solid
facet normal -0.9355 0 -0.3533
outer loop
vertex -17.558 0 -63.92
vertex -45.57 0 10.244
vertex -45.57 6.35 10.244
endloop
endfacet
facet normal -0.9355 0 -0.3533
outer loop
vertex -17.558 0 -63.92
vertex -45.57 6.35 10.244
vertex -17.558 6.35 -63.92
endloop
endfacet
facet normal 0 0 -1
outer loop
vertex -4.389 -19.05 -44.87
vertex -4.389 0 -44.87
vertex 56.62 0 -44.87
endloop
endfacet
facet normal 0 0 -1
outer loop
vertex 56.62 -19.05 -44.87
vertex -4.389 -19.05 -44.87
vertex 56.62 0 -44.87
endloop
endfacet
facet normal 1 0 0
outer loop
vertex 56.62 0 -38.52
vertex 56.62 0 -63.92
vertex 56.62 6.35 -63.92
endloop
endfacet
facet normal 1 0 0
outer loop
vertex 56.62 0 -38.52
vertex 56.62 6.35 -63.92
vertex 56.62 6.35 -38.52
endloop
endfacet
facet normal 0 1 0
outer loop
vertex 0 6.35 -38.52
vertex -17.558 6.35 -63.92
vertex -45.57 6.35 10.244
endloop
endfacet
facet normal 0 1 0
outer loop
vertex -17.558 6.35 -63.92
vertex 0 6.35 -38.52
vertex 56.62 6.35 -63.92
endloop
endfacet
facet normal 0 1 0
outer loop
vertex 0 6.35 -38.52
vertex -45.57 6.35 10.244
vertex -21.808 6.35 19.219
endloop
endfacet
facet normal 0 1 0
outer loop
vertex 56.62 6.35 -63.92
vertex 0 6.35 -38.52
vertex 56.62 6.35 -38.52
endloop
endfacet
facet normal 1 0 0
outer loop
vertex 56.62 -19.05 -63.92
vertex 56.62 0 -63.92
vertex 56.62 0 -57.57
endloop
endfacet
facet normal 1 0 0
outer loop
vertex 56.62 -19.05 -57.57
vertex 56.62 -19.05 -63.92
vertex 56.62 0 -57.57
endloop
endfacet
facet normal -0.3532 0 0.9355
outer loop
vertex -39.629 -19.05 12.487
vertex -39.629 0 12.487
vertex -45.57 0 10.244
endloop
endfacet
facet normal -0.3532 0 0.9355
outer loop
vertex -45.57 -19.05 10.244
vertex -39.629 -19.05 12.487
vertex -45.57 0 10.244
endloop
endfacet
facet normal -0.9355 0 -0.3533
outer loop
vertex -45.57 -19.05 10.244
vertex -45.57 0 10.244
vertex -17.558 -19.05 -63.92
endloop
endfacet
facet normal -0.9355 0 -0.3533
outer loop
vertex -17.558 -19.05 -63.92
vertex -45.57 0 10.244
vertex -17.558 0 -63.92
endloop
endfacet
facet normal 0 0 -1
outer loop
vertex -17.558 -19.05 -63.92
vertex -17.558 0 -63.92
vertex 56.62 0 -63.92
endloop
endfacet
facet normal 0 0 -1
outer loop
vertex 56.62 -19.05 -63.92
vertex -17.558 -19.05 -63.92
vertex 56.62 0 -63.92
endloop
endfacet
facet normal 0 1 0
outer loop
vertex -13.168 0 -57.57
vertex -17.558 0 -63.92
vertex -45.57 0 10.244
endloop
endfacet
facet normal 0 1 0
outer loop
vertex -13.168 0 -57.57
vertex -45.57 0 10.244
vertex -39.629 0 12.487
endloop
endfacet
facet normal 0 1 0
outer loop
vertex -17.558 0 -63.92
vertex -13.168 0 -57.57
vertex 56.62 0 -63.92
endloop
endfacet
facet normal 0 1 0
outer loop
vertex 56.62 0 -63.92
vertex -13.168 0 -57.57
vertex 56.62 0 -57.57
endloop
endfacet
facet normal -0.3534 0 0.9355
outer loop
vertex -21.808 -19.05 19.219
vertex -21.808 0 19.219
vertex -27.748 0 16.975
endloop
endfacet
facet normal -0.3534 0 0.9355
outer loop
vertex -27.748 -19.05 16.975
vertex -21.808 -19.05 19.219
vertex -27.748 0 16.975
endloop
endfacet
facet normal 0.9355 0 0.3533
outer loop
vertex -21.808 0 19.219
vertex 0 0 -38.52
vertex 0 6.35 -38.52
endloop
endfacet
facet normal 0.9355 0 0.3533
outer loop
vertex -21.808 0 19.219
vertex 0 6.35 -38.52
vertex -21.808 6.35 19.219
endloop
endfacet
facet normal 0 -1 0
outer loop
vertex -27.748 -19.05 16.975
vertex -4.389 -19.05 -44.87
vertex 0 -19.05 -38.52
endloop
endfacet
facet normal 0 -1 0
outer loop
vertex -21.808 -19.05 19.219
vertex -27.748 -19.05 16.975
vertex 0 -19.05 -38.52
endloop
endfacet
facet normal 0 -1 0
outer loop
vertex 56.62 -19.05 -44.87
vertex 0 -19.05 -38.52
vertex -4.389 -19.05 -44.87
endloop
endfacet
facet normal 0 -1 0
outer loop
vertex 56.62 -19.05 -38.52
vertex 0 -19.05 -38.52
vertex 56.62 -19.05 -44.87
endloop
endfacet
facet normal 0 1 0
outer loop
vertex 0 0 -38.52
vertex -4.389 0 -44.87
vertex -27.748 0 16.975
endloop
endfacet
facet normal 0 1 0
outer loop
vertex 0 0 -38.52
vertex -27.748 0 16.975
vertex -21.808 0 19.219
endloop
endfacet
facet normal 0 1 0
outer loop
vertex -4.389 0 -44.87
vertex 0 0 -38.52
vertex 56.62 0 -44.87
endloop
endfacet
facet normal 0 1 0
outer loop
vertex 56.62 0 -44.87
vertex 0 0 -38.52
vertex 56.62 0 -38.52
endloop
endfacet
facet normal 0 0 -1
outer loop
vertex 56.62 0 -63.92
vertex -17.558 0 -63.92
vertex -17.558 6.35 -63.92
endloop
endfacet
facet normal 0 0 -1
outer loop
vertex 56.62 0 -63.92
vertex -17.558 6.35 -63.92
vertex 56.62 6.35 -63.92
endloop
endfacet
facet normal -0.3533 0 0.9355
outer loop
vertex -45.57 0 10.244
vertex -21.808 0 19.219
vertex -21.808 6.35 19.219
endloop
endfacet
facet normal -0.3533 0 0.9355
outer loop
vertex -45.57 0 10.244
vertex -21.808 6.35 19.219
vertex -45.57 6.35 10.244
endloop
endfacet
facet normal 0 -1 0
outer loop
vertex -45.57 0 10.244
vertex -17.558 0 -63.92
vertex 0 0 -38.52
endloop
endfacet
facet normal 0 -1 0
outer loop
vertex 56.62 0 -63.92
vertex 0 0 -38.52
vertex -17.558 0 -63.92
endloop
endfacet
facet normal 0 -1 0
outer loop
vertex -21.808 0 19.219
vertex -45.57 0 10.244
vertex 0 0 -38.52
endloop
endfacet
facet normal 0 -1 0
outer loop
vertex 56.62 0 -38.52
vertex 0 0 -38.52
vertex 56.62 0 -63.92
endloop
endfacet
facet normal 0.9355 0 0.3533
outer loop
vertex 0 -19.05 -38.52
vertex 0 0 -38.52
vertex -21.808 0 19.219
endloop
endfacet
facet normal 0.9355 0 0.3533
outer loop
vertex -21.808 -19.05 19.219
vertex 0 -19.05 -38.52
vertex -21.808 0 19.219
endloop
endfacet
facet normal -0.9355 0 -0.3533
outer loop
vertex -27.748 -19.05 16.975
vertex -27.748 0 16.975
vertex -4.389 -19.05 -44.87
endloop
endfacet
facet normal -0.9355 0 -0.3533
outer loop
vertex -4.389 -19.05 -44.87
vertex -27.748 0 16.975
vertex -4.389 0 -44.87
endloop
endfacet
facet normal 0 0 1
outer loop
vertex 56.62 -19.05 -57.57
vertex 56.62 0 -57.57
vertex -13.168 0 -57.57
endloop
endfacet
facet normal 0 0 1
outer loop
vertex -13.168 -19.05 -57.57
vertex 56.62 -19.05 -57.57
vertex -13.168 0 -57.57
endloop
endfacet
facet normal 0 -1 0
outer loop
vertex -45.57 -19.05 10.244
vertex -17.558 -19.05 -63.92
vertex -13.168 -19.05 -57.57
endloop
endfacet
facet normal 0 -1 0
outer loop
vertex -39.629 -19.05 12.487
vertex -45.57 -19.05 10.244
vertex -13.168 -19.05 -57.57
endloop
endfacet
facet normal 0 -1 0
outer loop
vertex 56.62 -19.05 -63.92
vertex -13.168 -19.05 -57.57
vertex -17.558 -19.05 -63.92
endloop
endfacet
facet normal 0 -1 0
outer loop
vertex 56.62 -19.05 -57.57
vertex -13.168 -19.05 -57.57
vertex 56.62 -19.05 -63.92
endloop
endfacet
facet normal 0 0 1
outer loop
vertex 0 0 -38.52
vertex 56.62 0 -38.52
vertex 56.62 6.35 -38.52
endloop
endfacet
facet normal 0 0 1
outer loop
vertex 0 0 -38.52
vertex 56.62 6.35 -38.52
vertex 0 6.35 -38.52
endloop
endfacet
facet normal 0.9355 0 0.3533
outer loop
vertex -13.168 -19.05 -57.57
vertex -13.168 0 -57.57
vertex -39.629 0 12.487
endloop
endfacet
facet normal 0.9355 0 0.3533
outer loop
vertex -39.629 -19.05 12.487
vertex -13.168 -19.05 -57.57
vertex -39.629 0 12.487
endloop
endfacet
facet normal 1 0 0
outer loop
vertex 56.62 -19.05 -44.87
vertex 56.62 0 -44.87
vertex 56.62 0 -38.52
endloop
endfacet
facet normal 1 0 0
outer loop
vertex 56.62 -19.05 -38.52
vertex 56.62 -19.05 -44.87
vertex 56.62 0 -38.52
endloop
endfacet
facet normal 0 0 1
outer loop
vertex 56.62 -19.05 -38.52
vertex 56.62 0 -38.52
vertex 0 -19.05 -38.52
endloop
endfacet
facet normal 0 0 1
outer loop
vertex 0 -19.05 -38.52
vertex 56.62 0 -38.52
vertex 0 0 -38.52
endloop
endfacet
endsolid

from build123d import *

# Parameters (mm, degrees)
F2_DEPTH = 19.05
F4_DEPTH = 19.05
F5_DEPTH = 6.35


with BuildPart() as f2:
    # F1 (on Front) → F2 (new body)
    with BuildSketch(Plane.XZ):
        Polygon((-27.748478, 16.974805), (-4.389427, -44.869918), (56.619957, -44.869918), (56.619957, -38.519918), (0, -38.519918), (-21.808087, 19.21852), align=None)
    extrude(amount=F2_DEPTH)


with BuildPart() as f4:
    # F3 (on Front) → F4 (new body)
    with BuildSketch(Plane.XZ):
        Polygon((56.619957, -57.569919), (-13.168281, -57.569919), (-39.629261, 12.487376), (-45.56965, 10.243662), (-17.557707, -63.919917), (56.619957, -63.919917), align=None)
    extrude(amount=F4_DEPTH)


with BuildPart() as f5:
    # F0 (on Front) → F5 (new body)
    with BuildSketch(Plane.XZ):
        Polygon((0, -38.519919), (-21.808088, 19.218519), (-45.569652, 10.243661), (-17.557708, -63.919919), (56.619957, -63.919919), (56.619957, -38.519919), align=None)
    extrude(amount=-F5_DEPTH)


solid = Compound([f2.part, f4.part, f5.part])
